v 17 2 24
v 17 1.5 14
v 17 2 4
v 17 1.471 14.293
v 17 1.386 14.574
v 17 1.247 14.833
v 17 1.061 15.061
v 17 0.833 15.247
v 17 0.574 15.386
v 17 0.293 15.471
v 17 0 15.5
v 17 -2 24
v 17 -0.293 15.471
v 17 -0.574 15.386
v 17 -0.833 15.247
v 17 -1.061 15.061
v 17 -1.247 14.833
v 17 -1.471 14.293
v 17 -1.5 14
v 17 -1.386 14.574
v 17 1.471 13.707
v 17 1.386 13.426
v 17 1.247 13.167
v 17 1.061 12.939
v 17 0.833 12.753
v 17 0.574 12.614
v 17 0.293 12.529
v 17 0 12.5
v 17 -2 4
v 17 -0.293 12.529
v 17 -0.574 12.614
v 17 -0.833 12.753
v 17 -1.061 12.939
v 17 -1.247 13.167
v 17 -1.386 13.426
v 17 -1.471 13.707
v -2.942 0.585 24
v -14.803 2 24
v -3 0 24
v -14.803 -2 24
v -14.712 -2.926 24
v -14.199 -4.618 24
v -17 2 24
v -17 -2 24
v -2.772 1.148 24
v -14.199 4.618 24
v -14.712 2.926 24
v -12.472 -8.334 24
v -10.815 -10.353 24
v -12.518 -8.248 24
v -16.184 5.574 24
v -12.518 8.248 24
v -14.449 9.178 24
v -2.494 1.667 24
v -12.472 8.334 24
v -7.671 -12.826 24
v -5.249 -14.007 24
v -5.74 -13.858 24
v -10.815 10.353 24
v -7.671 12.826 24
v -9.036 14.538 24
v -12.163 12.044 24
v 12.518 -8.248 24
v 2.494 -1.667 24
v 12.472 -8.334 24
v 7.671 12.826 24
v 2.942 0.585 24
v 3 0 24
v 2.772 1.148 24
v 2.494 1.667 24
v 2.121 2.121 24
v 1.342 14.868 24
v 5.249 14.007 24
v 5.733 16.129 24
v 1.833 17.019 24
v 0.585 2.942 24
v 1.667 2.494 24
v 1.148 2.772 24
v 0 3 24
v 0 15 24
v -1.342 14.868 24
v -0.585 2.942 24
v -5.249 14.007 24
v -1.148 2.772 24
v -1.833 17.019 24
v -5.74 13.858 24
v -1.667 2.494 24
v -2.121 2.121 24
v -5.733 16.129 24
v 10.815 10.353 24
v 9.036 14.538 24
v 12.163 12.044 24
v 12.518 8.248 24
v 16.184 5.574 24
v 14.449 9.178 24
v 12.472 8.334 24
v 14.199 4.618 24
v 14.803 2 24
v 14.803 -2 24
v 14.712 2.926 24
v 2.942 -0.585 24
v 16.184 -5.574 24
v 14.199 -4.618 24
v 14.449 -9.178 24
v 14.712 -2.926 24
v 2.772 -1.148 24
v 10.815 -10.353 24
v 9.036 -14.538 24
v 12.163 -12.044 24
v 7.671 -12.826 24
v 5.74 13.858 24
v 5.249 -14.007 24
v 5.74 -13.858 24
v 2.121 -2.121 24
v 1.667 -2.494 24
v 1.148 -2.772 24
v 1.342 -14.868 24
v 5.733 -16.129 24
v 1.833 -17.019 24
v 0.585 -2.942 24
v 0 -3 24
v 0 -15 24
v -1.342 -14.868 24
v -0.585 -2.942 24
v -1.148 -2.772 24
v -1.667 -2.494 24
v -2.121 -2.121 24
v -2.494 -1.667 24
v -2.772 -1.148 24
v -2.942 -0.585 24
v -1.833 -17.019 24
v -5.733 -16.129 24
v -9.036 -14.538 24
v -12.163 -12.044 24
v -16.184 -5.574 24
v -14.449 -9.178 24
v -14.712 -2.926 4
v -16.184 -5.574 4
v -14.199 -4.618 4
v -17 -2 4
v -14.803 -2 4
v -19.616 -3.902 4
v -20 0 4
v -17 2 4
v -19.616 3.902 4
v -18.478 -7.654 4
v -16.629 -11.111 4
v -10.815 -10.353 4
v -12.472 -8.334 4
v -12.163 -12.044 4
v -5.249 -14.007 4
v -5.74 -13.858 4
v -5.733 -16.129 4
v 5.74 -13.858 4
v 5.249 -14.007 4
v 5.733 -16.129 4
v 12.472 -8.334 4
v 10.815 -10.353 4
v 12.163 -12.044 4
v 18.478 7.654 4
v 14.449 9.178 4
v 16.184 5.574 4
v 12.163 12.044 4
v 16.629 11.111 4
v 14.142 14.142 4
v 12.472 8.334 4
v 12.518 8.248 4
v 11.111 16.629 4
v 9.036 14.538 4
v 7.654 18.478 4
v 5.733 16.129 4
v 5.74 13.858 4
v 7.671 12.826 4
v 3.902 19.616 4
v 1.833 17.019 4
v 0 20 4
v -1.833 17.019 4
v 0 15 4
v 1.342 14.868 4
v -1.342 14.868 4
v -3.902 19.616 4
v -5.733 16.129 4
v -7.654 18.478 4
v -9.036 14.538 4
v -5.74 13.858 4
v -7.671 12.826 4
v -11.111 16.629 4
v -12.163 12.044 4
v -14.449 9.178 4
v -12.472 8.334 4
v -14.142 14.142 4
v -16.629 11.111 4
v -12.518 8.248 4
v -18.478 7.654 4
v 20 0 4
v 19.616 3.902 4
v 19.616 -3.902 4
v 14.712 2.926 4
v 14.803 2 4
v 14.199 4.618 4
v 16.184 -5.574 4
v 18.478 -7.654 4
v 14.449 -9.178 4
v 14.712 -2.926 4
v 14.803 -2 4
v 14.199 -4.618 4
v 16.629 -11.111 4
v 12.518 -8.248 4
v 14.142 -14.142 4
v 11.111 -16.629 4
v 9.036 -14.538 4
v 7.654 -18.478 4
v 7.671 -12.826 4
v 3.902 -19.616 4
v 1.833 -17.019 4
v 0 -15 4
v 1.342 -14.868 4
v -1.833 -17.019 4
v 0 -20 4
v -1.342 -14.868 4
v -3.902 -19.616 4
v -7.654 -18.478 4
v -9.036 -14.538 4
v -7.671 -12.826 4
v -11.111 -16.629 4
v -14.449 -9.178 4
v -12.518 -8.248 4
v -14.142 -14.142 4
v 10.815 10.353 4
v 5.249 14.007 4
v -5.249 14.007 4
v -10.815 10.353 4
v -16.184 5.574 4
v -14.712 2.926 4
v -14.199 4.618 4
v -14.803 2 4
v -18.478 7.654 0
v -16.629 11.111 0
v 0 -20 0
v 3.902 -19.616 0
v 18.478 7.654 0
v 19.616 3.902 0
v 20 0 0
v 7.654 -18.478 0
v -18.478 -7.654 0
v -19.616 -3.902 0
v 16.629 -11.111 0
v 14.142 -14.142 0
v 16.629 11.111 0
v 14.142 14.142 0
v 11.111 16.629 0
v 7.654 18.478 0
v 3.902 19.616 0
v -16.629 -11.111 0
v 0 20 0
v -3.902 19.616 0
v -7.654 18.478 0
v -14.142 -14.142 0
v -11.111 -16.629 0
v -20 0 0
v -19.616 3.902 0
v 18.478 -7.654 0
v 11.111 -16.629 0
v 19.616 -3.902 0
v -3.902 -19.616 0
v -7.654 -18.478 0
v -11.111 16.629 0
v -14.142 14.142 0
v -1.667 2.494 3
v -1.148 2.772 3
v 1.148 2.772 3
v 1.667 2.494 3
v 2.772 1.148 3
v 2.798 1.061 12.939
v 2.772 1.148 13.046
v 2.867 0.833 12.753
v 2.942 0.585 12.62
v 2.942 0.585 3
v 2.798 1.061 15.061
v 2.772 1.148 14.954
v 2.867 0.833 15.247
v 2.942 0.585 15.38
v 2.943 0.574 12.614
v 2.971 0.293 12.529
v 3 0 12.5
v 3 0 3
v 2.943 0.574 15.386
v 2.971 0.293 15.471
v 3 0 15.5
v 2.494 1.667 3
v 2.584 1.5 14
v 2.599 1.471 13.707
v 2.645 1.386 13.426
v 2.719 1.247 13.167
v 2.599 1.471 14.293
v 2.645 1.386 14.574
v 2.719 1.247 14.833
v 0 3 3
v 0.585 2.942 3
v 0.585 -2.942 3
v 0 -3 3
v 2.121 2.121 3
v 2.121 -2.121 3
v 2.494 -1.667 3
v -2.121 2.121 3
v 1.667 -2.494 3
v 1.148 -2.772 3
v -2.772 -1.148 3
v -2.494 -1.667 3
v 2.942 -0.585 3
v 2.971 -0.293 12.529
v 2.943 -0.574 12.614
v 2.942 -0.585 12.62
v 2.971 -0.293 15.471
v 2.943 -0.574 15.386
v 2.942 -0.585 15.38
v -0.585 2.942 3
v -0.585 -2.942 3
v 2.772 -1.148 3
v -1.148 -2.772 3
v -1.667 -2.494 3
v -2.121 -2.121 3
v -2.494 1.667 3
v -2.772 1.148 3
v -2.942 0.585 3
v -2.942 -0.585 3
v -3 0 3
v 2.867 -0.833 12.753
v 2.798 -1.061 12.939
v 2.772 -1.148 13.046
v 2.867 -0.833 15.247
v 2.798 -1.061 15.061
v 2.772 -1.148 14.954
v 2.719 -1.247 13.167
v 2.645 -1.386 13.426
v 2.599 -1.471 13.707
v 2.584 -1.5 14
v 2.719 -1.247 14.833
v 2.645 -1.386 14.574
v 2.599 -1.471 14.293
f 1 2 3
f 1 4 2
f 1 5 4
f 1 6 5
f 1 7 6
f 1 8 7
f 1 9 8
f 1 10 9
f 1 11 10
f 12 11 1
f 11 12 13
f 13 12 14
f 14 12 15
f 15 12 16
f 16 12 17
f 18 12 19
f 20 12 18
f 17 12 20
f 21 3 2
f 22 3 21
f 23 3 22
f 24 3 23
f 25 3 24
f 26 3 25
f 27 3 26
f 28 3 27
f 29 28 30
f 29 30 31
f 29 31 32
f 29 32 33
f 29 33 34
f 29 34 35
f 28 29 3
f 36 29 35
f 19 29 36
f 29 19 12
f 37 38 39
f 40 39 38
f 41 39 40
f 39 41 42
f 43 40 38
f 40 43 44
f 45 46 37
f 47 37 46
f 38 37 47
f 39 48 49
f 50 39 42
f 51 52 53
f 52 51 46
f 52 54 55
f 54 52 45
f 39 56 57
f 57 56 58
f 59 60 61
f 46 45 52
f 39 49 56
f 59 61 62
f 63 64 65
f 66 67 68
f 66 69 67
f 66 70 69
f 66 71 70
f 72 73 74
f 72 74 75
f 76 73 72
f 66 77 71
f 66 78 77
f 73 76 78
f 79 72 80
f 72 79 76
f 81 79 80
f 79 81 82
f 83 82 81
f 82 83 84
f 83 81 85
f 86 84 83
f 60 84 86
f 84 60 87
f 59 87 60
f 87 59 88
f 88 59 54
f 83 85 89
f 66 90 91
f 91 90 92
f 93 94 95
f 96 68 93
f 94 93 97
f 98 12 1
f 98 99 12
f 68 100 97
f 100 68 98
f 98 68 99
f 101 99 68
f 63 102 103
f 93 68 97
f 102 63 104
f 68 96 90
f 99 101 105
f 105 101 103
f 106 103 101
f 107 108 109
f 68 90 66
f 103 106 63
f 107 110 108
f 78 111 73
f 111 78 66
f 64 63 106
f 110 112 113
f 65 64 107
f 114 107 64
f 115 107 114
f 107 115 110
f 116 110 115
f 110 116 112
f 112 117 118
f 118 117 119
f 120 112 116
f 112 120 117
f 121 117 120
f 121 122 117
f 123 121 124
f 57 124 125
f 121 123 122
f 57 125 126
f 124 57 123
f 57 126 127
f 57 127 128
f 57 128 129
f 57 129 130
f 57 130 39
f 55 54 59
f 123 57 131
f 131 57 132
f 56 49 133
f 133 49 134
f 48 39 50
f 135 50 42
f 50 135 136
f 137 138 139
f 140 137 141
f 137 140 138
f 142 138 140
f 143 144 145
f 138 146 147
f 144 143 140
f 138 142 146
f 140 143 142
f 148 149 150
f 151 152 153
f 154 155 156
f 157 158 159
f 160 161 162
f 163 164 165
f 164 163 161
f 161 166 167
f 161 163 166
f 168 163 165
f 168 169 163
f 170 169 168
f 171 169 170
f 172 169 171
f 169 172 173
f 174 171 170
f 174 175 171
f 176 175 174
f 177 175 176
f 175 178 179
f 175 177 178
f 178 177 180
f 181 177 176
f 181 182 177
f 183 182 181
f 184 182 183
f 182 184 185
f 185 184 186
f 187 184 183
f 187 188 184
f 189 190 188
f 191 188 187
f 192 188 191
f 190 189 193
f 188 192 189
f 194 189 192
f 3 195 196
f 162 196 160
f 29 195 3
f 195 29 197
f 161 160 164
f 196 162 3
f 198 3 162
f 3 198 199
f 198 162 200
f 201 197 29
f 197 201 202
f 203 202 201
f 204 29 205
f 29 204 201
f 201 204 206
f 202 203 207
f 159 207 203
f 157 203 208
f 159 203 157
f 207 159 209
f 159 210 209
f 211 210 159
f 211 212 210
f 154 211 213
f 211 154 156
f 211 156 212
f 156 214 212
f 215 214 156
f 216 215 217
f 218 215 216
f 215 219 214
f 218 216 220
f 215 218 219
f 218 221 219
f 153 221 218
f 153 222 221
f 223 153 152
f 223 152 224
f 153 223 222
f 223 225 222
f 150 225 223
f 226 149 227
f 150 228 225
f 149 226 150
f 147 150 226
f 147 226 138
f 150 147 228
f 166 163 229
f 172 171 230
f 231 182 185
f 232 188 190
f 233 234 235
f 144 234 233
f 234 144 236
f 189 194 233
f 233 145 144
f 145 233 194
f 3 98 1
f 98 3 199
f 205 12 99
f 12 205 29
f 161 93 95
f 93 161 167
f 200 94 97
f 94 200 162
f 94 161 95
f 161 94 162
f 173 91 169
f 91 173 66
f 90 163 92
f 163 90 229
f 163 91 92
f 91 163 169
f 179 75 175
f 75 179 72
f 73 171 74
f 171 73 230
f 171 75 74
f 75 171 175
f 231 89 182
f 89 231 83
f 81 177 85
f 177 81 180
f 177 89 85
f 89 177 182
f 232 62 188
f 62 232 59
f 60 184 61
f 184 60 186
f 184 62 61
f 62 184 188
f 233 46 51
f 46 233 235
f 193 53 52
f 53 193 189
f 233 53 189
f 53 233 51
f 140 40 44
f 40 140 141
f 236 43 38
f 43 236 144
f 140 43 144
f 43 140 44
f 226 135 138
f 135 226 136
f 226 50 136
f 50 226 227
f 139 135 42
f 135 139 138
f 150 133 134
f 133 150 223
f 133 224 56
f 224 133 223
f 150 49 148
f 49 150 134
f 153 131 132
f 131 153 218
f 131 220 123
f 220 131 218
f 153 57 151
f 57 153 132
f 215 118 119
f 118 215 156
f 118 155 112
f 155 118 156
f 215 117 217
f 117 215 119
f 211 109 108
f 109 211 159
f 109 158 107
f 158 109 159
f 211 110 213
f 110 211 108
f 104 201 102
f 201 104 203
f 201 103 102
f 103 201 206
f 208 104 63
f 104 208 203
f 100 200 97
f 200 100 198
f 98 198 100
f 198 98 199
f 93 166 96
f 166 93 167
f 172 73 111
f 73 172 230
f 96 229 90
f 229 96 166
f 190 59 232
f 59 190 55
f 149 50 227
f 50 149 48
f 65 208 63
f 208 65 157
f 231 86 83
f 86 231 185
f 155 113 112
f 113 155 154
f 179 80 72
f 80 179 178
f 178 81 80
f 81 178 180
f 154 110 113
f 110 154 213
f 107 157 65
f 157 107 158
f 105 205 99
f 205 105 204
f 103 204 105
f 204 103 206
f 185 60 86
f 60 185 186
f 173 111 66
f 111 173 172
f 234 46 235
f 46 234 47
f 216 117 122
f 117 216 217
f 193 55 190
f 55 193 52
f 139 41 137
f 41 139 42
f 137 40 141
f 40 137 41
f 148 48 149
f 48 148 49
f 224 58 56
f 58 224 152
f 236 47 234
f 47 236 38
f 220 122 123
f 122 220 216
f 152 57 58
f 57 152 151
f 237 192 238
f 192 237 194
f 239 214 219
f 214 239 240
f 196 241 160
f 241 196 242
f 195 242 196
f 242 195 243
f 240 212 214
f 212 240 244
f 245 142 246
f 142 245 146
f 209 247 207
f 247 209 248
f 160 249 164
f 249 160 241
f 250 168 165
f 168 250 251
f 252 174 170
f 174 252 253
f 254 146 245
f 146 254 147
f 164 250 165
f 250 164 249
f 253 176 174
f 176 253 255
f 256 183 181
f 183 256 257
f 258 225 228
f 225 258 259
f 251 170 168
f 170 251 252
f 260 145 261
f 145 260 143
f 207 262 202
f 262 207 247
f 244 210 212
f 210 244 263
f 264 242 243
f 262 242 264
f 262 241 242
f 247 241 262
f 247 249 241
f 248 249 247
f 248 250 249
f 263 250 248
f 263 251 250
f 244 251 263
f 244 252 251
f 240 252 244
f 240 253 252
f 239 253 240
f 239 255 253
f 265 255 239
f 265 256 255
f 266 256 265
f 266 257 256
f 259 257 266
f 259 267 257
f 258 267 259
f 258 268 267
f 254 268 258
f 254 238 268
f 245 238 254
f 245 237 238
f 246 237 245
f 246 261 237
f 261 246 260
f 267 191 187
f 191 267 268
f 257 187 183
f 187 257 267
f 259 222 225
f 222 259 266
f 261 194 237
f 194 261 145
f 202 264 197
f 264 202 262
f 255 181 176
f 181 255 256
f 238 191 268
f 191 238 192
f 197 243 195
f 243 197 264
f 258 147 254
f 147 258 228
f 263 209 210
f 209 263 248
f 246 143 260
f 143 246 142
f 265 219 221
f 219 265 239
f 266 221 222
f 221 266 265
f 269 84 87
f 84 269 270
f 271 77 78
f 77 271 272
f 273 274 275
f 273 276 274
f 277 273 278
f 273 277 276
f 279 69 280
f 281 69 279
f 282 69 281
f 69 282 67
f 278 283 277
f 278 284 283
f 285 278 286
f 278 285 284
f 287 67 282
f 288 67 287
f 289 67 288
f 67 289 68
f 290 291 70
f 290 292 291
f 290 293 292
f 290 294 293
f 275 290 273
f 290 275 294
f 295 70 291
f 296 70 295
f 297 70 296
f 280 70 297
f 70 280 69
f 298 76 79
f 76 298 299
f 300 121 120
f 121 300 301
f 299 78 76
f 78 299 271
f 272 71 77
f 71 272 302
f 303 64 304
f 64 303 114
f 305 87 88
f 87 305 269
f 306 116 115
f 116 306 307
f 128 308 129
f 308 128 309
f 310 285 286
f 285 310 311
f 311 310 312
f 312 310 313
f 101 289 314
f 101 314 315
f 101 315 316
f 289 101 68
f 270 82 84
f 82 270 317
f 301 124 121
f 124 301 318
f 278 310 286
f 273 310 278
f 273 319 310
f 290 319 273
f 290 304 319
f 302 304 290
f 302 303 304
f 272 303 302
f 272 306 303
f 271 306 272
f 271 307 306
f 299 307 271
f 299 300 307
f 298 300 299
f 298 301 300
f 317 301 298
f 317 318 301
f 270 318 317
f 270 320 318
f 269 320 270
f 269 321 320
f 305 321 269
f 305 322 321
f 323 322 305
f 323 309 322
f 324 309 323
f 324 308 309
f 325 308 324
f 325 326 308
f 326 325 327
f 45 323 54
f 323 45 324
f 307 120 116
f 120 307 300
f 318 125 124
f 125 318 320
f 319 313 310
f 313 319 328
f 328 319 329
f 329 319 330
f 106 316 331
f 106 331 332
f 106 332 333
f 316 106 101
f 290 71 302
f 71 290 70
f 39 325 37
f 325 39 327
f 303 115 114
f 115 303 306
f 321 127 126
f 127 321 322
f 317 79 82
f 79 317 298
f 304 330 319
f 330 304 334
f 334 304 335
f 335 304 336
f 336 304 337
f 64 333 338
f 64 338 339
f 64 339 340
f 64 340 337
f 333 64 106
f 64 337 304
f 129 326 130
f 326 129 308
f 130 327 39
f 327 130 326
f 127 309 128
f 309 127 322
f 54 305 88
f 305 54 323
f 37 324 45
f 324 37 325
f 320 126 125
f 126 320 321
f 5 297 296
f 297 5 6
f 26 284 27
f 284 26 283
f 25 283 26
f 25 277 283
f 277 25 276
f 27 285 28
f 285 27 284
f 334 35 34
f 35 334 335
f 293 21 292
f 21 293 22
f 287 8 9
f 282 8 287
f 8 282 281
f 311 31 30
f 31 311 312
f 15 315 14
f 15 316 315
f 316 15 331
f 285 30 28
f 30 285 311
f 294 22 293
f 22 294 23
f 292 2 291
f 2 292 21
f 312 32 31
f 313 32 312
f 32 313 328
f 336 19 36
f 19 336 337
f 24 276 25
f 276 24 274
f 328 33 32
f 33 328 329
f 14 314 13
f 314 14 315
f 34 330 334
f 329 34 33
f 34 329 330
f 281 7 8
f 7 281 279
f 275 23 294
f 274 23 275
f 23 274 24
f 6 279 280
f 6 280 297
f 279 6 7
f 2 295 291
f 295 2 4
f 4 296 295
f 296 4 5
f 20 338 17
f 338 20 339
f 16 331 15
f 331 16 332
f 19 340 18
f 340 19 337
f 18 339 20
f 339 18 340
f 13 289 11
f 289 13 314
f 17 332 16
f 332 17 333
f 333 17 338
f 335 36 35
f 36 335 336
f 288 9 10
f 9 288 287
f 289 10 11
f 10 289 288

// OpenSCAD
$fn = 32;

// ----------------------------------------------------------------------
// Control knob: skirt knob with grip ribs
// ----------------------------------------------------------------------

// --- parameters (mm) ---
skirt_d = 40;             // skirt diameter
skirt_t = 4;              // skirt thickness
rib_w = 4;                // grip rib width
rib_out = 3;              // grip rib radial protrusion
n_ribs = 14;              // number of grip ribs
knob_d = 30;              // knob body diameter
knob_h = 20;              // knob body height
bore_d = 6;               // shaft bore diameter
set_d = 3;                // set screw bore diameter

rib_step = 360 / n_ribs;  // rib angular step
total_h = skirt_t + knob_h;  // overall height

difference() {
  union() {
    translate([0, 0, skirt_t]) cylinder(h = knob_h, d = knob_d);
    cylinder(h = skirt_t, d = skirt_d);
    for (i = [0 : n_ribs - 1])
      rotate([0, 0, i * rib_step])
        translate([knob_d / 2 - 1, -rib_w / 2, skirt_t])
          cube([rib_out, rib_w, knob_h]);
  }
  translate([0, 0, skirt_t - 1]) cylinder(h = knob_h + 2, d = bore_d);
  translate([-1, 0, skirt_t + knob_h / 2]) rotate([0, 90, 0])
    cylinder(h = knob_d / 2 + bore_d / 2 + 2, d = set_d);
}
